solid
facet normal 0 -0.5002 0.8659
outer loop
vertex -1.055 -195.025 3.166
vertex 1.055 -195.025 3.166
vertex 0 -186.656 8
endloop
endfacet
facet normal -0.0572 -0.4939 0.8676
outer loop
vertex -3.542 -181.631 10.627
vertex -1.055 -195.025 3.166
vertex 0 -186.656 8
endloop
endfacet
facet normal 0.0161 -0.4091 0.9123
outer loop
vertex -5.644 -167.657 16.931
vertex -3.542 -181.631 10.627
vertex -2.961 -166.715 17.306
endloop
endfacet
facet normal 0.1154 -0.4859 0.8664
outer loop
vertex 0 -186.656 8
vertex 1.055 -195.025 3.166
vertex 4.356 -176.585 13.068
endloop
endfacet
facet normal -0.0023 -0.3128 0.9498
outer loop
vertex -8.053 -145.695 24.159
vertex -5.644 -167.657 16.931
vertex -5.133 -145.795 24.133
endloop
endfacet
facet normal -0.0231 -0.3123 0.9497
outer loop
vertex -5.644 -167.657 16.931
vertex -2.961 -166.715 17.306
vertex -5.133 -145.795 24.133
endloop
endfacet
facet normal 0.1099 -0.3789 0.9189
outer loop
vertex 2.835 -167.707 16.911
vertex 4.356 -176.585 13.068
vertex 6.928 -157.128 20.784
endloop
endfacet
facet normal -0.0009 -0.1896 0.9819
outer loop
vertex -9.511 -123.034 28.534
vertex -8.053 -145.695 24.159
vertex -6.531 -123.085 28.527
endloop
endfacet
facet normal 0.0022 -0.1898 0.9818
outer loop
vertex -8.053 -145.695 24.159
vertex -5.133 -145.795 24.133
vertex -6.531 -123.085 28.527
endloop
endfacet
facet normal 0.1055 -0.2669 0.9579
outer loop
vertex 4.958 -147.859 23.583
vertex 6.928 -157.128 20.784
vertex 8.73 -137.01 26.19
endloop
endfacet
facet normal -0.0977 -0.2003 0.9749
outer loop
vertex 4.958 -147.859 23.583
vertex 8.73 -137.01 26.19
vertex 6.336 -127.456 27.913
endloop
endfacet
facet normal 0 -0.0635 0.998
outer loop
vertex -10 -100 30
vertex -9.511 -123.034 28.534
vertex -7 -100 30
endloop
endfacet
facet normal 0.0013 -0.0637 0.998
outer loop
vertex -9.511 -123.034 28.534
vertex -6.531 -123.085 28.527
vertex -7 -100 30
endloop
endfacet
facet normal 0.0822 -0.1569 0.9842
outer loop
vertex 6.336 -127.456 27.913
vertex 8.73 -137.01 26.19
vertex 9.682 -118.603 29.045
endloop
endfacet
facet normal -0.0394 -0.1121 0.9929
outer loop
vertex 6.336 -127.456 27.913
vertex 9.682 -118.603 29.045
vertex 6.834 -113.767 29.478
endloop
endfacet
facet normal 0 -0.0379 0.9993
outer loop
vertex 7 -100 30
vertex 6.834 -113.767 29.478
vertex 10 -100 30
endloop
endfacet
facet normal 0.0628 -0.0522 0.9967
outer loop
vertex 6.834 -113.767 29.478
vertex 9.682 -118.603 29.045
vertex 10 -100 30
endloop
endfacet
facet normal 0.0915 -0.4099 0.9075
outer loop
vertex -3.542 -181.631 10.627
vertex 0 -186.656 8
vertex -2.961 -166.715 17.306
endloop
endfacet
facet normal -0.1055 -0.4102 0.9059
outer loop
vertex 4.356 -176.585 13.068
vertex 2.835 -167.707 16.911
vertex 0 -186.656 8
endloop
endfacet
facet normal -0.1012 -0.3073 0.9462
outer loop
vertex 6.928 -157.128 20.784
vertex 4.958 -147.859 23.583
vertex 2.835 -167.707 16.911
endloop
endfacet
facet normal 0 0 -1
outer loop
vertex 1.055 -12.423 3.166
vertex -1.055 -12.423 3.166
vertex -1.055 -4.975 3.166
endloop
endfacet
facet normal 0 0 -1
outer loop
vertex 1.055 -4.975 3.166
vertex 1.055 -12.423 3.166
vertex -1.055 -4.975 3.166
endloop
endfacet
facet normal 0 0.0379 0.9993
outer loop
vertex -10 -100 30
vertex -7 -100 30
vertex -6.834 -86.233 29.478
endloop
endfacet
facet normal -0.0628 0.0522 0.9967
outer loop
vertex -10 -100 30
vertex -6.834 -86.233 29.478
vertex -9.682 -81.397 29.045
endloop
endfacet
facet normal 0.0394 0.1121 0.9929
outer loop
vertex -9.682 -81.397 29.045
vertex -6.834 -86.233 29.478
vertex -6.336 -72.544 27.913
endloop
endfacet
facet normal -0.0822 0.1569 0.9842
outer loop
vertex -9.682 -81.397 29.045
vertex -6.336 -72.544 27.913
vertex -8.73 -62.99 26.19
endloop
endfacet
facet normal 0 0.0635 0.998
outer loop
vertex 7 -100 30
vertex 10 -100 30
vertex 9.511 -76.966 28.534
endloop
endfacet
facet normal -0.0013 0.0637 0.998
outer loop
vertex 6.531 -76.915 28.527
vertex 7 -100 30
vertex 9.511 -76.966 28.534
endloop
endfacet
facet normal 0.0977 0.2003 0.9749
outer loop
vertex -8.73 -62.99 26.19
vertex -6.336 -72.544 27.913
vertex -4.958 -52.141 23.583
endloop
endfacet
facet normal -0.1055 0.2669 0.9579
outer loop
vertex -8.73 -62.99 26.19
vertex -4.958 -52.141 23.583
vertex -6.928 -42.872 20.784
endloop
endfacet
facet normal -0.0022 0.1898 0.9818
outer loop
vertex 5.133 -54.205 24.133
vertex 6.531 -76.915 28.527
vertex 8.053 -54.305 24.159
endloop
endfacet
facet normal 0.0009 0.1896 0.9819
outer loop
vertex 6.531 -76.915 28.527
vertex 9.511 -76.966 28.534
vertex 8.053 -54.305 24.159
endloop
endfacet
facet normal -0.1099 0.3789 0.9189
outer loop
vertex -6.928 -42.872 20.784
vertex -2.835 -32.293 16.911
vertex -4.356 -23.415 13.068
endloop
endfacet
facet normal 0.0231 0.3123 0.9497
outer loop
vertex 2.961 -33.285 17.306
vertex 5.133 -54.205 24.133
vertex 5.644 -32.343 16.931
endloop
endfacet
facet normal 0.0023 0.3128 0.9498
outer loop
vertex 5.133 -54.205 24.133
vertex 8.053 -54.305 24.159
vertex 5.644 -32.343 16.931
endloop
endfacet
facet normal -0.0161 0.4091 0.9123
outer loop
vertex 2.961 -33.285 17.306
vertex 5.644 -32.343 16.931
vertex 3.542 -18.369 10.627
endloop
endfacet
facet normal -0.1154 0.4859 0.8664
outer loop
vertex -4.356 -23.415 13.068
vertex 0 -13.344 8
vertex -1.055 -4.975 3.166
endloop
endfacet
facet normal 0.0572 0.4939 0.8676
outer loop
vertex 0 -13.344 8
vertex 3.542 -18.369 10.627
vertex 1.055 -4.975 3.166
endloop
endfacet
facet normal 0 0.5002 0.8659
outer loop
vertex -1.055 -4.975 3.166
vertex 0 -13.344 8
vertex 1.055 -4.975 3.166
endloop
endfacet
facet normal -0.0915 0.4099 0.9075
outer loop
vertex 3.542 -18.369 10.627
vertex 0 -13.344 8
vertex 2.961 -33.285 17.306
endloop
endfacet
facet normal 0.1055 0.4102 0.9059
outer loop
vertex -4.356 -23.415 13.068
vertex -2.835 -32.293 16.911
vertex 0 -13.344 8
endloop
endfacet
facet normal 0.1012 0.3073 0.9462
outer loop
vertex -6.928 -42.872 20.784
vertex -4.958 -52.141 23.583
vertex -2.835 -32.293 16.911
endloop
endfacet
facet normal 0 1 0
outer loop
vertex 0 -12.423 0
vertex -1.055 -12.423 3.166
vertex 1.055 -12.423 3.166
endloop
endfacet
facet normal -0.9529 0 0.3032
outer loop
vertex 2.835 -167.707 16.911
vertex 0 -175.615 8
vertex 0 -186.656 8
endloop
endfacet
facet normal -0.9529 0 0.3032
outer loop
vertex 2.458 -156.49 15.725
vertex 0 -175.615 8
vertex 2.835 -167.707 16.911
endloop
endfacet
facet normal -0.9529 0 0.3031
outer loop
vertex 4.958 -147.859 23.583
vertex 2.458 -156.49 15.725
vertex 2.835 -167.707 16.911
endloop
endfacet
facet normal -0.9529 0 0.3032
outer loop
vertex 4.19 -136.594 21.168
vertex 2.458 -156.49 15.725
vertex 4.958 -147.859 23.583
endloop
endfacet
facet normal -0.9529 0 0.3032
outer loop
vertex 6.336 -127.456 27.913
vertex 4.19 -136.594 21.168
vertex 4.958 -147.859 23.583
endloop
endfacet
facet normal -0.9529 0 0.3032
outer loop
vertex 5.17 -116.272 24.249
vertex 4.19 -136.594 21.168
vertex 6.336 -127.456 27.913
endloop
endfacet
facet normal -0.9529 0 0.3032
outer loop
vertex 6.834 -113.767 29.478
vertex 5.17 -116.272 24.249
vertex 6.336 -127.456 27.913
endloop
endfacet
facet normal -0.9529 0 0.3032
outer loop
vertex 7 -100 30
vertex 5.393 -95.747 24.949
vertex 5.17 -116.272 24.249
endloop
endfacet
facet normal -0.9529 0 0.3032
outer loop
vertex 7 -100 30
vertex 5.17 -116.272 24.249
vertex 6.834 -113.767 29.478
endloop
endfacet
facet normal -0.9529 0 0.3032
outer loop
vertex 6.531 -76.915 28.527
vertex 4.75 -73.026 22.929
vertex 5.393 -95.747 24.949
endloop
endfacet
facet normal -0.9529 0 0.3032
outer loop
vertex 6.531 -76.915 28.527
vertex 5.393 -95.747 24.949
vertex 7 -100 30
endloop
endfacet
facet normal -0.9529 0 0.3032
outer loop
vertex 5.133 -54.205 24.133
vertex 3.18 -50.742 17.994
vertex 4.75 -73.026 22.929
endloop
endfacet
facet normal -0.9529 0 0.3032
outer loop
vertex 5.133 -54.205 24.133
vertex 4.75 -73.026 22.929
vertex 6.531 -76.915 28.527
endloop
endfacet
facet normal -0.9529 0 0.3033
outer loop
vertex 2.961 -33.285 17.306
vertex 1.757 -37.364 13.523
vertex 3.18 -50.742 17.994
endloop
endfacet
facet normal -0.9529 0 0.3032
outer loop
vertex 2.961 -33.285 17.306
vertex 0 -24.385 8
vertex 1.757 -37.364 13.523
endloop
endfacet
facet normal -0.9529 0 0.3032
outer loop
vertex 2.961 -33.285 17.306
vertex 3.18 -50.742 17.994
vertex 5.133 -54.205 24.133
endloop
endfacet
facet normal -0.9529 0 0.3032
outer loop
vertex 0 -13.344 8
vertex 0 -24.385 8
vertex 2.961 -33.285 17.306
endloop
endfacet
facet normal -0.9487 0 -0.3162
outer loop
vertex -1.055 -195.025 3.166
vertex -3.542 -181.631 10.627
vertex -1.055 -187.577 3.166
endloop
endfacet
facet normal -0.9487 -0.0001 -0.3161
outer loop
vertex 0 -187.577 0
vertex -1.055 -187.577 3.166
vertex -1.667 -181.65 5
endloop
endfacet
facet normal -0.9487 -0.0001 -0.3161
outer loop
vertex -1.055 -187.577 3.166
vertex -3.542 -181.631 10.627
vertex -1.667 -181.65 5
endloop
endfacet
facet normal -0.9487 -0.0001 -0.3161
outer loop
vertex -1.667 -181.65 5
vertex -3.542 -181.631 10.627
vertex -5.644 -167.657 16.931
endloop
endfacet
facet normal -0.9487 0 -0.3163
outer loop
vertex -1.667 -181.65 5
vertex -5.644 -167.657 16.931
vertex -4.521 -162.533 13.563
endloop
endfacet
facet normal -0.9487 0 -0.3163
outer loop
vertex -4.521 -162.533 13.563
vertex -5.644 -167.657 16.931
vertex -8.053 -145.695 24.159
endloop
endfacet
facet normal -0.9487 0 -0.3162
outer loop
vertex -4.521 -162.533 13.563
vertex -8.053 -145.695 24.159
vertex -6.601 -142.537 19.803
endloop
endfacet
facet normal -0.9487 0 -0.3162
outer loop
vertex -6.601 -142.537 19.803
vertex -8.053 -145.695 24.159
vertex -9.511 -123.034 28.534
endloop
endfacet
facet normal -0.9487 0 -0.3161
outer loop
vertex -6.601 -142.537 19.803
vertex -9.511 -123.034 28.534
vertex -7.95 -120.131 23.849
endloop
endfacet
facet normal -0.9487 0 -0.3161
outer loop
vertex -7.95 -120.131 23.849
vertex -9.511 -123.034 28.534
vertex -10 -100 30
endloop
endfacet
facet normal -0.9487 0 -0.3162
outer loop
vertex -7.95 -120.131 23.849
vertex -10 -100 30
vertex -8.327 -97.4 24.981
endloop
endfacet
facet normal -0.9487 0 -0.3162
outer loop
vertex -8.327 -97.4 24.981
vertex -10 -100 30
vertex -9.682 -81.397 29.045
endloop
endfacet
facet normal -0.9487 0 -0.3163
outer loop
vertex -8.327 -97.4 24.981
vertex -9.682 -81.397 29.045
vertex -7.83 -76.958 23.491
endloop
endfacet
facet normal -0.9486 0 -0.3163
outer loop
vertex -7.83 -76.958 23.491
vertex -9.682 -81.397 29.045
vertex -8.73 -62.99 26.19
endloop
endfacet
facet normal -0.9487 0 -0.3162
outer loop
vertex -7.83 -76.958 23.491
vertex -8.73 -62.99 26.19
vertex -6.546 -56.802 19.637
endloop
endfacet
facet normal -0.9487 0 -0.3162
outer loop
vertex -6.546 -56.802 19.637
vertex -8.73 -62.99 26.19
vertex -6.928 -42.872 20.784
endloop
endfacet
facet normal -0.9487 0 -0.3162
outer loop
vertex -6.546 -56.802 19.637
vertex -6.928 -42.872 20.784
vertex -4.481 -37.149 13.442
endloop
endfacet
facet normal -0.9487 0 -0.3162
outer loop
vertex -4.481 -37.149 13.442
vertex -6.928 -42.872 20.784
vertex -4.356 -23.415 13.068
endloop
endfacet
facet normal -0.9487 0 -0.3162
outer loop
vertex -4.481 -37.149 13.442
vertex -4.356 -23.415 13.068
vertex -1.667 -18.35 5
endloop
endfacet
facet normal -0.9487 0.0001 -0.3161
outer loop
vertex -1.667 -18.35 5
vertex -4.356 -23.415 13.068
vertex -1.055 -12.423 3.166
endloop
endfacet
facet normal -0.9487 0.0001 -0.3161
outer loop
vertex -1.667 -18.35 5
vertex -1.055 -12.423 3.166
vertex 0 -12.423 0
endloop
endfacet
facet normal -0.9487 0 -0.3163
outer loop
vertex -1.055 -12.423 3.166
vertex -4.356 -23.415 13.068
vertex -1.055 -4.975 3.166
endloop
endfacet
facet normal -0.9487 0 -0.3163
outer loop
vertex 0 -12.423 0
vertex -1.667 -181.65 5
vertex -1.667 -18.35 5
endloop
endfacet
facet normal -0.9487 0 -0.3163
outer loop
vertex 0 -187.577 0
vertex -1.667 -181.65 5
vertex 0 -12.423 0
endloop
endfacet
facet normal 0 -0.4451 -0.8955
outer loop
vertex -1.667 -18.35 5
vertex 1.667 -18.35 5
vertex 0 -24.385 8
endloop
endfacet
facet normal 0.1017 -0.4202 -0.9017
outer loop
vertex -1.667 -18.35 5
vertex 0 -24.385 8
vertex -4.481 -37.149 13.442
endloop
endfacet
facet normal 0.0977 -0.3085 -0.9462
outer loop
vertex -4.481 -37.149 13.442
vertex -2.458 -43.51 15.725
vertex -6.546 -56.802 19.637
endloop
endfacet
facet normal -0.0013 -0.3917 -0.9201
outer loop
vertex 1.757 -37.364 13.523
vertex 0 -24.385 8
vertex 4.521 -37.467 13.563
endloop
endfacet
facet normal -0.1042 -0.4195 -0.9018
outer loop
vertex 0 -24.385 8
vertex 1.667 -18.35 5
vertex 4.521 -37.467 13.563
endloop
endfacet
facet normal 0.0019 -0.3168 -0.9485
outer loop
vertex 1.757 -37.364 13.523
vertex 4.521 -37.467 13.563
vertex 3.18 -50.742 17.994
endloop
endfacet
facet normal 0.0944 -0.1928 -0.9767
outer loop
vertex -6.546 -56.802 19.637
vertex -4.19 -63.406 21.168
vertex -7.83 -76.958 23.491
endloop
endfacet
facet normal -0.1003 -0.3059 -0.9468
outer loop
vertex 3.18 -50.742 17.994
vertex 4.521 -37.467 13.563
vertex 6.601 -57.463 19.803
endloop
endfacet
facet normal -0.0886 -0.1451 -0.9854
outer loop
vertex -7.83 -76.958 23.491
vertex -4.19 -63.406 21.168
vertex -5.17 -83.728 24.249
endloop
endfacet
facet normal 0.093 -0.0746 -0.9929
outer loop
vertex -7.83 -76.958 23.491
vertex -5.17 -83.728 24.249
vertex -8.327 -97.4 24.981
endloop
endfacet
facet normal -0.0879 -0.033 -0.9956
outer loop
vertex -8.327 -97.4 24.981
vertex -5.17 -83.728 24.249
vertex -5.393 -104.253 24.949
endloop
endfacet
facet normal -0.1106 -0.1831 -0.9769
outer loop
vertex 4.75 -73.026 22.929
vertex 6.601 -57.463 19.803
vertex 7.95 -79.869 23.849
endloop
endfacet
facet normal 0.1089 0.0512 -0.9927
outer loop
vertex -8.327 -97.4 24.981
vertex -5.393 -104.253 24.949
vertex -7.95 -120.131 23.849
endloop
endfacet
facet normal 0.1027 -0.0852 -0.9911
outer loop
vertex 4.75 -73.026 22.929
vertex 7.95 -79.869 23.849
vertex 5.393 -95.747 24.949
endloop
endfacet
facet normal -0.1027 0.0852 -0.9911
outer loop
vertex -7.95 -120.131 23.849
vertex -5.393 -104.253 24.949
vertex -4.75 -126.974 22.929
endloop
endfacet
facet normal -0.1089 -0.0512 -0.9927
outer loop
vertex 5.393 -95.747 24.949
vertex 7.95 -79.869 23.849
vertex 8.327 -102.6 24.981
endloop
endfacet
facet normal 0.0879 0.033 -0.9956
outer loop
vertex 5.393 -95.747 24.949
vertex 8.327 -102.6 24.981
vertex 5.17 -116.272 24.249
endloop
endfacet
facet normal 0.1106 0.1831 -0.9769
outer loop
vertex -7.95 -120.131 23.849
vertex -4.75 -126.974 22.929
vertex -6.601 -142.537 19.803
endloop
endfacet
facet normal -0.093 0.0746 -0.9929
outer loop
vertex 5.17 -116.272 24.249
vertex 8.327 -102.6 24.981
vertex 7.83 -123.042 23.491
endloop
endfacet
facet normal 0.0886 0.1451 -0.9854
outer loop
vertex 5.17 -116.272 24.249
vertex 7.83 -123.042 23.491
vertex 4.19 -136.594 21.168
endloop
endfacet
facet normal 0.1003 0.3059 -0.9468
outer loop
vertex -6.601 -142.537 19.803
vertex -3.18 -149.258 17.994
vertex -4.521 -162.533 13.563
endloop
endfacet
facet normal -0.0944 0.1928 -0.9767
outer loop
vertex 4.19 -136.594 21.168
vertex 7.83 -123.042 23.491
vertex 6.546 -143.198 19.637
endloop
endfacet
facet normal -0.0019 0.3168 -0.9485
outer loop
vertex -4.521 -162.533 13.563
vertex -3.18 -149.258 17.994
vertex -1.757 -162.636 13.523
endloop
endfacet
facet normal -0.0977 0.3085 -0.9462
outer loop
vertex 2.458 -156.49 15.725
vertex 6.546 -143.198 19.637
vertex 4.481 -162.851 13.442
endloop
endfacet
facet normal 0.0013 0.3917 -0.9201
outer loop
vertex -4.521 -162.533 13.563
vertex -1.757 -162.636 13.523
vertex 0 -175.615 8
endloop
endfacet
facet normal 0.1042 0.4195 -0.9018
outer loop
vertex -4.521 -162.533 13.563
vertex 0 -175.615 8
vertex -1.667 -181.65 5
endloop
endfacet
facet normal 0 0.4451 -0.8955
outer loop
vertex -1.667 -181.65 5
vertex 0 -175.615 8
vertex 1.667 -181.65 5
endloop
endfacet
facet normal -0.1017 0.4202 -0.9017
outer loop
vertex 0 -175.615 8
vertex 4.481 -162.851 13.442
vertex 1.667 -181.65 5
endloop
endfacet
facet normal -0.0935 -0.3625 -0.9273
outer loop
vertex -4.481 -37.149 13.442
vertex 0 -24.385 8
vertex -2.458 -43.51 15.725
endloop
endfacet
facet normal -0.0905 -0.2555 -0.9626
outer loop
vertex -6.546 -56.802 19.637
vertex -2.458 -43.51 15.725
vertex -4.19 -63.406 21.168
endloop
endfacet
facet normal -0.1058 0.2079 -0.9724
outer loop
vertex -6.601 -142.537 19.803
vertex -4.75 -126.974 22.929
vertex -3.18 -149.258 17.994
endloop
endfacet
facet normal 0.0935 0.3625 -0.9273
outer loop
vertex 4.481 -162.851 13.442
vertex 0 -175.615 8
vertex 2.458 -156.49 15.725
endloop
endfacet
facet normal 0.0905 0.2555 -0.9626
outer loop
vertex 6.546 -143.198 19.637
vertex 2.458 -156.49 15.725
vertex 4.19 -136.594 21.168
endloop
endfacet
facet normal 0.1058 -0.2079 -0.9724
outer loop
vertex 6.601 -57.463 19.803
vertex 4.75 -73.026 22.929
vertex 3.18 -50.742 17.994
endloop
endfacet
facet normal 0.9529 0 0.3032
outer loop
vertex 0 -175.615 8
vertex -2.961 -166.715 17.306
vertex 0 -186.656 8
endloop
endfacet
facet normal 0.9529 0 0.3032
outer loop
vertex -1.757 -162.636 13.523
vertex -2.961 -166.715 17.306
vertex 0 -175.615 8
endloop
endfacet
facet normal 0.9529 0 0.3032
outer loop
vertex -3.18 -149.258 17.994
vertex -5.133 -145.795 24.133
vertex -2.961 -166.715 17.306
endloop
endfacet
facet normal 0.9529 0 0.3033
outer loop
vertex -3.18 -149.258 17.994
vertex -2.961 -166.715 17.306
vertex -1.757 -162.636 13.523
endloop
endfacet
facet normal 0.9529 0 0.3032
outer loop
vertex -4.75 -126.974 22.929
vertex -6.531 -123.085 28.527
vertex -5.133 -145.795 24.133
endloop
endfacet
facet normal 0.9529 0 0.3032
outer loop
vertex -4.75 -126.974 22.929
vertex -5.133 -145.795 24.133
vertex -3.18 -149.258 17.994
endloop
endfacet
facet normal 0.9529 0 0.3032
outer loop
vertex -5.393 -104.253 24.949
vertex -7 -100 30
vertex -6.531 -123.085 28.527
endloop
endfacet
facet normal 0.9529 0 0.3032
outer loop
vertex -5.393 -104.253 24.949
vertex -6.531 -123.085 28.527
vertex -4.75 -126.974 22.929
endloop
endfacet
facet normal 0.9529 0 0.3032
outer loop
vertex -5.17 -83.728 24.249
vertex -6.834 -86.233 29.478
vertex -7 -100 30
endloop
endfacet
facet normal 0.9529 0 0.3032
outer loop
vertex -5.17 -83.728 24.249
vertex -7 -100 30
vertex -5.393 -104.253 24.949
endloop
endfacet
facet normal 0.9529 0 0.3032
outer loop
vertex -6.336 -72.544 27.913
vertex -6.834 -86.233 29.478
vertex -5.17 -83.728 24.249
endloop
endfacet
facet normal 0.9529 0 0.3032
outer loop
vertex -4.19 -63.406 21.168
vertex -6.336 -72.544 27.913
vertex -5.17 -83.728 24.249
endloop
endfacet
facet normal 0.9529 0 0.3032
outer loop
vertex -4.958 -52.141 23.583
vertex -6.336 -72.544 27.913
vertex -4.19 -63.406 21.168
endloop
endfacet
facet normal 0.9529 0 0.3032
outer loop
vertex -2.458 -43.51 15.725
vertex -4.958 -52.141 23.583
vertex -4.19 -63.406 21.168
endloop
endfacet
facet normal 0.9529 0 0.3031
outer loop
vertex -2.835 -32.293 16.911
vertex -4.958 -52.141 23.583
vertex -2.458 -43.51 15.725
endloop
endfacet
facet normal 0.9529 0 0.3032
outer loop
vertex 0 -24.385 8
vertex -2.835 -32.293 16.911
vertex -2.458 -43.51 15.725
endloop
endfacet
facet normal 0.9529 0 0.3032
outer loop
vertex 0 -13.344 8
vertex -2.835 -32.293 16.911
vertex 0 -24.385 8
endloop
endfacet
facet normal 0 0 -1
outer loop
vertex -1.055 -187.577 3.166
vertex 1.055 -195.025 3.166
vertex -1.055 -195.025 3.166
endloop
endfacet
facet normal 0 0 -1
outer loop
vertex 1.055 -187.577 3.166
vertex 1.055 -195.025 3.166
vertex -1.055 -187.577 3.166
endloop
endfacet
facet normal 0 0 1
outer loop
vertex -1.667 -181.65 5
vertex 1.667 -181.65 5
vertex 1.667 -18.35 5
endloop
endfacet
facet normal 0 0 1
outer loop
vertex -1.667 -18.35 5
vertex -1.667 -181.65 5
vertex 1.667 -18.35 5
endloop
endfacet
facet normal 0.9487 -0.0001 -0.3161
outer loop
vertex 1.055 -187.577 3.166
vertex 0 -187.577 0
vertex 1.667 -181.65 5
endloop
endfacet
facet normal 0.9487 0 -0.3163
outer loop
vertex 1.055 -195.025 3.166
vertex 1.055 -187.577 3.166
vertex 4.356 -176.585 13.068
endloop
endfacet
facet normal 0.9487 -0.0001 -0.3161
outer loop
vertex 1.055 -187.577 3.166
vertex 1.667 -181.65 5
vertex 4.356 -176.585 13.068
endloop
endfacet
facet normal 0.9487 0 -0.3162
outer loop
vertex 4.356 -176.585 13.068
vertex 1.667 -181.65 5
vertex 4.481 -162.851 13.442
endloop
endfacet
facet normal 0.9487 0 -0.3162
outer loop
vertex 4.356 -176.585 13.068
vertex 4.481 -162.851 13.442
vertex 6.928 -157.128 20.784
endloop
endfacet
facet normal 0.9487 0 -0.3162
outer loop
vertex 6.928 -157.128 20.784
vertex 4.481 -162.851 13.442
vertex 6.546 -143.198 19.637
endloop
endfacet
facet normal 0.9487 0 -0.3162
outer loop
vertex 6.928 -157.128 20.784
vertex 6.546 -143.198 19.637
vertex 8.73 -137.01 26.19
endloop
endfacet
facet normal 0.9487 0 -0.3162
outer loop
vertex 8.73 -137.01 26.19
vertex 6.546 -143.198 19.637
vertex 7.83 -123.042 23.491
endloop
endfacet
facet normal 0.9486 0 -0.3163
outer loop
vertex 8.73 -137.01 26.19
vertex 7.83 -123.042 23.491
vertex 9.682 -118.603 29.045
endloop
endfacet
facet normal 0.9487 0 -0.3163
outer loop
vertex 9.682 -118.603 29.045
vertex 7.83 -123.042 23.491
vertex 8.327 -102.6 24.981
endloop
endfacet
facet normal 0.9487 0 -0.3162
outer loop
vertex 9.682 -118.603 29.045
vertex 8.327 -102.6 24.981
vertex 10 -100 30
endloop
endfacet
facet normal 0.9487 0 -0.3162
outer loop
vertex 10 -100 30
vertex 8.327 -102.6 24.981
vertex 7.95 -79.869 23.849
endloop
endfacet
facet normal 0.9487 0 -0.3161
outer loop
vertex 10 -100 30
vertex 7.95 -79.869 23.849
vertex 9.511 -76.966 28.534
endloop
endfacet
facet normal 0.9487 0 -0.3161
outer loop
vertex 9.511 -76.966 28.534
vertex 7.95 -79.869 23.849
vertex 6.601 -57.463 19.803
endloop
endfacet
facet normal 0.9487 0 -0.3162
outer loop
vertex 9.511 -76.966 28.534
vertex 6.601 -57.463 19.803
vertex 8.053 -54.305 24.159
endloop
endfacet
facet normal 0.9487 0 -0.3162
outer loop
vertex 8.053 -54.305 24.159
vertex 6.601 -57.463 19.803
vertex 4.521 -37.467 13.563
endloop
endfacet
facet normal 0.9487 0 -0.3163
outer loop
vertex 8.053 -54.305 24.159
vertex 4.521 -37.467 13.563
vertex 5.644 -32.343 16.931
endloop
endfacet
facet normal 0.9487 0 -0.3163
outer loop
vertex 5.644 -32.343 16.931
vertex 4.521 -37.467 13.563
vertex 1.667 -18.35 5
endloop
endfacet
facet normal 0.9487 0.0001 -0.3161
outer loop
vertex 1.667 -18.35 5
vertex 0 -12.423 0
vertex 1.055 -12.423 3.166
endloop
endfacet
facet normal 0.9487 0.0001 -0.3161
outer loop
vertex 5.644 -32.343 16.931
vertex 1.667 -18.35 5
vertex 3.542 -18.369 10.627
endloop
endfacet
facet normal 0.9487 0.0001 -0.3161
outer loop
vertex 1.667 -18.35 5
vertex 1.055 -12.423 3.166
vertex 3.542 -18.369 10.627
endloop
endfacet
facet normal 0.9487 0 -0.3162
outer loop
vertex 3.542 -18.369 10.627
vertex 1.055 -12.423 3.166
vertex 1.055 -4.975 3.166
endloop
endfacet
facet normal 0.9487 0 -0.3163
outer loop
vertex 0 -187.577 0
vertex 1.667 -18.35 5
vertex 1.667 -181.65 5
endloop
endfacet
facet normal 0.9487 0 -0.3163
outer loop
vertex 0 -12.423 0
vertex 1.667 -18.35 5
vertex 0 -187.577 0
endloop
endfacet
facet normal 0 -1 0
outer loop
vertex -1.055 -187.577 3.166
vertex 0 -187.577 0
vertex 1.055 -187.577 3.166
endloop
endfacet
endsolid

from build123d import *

# Parameters (mm, degrees)
F1_DEPTH = 200
F3_DEPTH = 12.5
F5_DEPTH = 200.001
F7_DEPTH = 12.5
F8_W     = 12.42342
F8_H     = 5.245147
F8_H_2   = 3.165806
F8_H_3   = 8.410953
F9_DEPTH = 12.5


with BuildPart() as f1:
    # F0 (on Front) → F1 (new body)
    with BuildSketch(Plane.XZ):
        Polygon((-10, 30), (0, 0), (10, 30), align=None)
    extrude(amount=F1_DEPTH)

    # F2 (on Right) → F3 (cut, symmetric)
    with BuildSketch(Plane.YZ):
        with BuildLine():
            ThreePointArc((-100, 30), (-47.798467, 22.338442), (0, 0))
            Line((0, 0), (0, 30))
            Line((0, 30), (-100, 30))
        make_face()
        with BuildLine():
            ThreePointArc((-200, 0), (-152.201533, 22.338442), (-100, 30))
            Line((-100, 30), (-200, 30))
            Line((-200, 30), (-200, 0))
        make_face()
    extrude(amount=F3_DEPTH, both=True, mode=Mode.SUBTRACT)

    # F4 (on Front) → F5 (cut, through all)
    with BuildSketch(Plane.XZ):
        Polygon((-7, 30), (0, 8), (7, 30), align=None)
    extrude(amount=F5_DEPTH, mode=Mode.SUBTRACT)

    # F6 (on Right) → F7 (cut, symmetric)
    with BuildSketch(Plane.YZ):
        with BuildLine():
            ThreePointArc((-18.35034, 5), (-100, 25), (-181.64966, 5))
            Line((-181.64966, 5), (-18.35034, 5))
        make_face()
    extrude(amount=F7_DEPTH, both=True, mode=Mode.SUBTRACT)

    # F8 (on Right) → F9 (cut, symmetric)
    with BuildSketch(Plane.YZ):
        with Locations((-6.21171, -2.622573)):
            Rectangle(F8_W, F8_H)
        with Locations((-6.21171, 1.582903)):
            Rectangle(F8_W, F8_H_2)
        with Locations((-193.78829, -1.03967)):
            Rectangle(F8_W, F8_H_3)
    extrude(amount=F9_DEPTH, both=True, mode=Mode.SUBTRACT)


solid = f1.part
